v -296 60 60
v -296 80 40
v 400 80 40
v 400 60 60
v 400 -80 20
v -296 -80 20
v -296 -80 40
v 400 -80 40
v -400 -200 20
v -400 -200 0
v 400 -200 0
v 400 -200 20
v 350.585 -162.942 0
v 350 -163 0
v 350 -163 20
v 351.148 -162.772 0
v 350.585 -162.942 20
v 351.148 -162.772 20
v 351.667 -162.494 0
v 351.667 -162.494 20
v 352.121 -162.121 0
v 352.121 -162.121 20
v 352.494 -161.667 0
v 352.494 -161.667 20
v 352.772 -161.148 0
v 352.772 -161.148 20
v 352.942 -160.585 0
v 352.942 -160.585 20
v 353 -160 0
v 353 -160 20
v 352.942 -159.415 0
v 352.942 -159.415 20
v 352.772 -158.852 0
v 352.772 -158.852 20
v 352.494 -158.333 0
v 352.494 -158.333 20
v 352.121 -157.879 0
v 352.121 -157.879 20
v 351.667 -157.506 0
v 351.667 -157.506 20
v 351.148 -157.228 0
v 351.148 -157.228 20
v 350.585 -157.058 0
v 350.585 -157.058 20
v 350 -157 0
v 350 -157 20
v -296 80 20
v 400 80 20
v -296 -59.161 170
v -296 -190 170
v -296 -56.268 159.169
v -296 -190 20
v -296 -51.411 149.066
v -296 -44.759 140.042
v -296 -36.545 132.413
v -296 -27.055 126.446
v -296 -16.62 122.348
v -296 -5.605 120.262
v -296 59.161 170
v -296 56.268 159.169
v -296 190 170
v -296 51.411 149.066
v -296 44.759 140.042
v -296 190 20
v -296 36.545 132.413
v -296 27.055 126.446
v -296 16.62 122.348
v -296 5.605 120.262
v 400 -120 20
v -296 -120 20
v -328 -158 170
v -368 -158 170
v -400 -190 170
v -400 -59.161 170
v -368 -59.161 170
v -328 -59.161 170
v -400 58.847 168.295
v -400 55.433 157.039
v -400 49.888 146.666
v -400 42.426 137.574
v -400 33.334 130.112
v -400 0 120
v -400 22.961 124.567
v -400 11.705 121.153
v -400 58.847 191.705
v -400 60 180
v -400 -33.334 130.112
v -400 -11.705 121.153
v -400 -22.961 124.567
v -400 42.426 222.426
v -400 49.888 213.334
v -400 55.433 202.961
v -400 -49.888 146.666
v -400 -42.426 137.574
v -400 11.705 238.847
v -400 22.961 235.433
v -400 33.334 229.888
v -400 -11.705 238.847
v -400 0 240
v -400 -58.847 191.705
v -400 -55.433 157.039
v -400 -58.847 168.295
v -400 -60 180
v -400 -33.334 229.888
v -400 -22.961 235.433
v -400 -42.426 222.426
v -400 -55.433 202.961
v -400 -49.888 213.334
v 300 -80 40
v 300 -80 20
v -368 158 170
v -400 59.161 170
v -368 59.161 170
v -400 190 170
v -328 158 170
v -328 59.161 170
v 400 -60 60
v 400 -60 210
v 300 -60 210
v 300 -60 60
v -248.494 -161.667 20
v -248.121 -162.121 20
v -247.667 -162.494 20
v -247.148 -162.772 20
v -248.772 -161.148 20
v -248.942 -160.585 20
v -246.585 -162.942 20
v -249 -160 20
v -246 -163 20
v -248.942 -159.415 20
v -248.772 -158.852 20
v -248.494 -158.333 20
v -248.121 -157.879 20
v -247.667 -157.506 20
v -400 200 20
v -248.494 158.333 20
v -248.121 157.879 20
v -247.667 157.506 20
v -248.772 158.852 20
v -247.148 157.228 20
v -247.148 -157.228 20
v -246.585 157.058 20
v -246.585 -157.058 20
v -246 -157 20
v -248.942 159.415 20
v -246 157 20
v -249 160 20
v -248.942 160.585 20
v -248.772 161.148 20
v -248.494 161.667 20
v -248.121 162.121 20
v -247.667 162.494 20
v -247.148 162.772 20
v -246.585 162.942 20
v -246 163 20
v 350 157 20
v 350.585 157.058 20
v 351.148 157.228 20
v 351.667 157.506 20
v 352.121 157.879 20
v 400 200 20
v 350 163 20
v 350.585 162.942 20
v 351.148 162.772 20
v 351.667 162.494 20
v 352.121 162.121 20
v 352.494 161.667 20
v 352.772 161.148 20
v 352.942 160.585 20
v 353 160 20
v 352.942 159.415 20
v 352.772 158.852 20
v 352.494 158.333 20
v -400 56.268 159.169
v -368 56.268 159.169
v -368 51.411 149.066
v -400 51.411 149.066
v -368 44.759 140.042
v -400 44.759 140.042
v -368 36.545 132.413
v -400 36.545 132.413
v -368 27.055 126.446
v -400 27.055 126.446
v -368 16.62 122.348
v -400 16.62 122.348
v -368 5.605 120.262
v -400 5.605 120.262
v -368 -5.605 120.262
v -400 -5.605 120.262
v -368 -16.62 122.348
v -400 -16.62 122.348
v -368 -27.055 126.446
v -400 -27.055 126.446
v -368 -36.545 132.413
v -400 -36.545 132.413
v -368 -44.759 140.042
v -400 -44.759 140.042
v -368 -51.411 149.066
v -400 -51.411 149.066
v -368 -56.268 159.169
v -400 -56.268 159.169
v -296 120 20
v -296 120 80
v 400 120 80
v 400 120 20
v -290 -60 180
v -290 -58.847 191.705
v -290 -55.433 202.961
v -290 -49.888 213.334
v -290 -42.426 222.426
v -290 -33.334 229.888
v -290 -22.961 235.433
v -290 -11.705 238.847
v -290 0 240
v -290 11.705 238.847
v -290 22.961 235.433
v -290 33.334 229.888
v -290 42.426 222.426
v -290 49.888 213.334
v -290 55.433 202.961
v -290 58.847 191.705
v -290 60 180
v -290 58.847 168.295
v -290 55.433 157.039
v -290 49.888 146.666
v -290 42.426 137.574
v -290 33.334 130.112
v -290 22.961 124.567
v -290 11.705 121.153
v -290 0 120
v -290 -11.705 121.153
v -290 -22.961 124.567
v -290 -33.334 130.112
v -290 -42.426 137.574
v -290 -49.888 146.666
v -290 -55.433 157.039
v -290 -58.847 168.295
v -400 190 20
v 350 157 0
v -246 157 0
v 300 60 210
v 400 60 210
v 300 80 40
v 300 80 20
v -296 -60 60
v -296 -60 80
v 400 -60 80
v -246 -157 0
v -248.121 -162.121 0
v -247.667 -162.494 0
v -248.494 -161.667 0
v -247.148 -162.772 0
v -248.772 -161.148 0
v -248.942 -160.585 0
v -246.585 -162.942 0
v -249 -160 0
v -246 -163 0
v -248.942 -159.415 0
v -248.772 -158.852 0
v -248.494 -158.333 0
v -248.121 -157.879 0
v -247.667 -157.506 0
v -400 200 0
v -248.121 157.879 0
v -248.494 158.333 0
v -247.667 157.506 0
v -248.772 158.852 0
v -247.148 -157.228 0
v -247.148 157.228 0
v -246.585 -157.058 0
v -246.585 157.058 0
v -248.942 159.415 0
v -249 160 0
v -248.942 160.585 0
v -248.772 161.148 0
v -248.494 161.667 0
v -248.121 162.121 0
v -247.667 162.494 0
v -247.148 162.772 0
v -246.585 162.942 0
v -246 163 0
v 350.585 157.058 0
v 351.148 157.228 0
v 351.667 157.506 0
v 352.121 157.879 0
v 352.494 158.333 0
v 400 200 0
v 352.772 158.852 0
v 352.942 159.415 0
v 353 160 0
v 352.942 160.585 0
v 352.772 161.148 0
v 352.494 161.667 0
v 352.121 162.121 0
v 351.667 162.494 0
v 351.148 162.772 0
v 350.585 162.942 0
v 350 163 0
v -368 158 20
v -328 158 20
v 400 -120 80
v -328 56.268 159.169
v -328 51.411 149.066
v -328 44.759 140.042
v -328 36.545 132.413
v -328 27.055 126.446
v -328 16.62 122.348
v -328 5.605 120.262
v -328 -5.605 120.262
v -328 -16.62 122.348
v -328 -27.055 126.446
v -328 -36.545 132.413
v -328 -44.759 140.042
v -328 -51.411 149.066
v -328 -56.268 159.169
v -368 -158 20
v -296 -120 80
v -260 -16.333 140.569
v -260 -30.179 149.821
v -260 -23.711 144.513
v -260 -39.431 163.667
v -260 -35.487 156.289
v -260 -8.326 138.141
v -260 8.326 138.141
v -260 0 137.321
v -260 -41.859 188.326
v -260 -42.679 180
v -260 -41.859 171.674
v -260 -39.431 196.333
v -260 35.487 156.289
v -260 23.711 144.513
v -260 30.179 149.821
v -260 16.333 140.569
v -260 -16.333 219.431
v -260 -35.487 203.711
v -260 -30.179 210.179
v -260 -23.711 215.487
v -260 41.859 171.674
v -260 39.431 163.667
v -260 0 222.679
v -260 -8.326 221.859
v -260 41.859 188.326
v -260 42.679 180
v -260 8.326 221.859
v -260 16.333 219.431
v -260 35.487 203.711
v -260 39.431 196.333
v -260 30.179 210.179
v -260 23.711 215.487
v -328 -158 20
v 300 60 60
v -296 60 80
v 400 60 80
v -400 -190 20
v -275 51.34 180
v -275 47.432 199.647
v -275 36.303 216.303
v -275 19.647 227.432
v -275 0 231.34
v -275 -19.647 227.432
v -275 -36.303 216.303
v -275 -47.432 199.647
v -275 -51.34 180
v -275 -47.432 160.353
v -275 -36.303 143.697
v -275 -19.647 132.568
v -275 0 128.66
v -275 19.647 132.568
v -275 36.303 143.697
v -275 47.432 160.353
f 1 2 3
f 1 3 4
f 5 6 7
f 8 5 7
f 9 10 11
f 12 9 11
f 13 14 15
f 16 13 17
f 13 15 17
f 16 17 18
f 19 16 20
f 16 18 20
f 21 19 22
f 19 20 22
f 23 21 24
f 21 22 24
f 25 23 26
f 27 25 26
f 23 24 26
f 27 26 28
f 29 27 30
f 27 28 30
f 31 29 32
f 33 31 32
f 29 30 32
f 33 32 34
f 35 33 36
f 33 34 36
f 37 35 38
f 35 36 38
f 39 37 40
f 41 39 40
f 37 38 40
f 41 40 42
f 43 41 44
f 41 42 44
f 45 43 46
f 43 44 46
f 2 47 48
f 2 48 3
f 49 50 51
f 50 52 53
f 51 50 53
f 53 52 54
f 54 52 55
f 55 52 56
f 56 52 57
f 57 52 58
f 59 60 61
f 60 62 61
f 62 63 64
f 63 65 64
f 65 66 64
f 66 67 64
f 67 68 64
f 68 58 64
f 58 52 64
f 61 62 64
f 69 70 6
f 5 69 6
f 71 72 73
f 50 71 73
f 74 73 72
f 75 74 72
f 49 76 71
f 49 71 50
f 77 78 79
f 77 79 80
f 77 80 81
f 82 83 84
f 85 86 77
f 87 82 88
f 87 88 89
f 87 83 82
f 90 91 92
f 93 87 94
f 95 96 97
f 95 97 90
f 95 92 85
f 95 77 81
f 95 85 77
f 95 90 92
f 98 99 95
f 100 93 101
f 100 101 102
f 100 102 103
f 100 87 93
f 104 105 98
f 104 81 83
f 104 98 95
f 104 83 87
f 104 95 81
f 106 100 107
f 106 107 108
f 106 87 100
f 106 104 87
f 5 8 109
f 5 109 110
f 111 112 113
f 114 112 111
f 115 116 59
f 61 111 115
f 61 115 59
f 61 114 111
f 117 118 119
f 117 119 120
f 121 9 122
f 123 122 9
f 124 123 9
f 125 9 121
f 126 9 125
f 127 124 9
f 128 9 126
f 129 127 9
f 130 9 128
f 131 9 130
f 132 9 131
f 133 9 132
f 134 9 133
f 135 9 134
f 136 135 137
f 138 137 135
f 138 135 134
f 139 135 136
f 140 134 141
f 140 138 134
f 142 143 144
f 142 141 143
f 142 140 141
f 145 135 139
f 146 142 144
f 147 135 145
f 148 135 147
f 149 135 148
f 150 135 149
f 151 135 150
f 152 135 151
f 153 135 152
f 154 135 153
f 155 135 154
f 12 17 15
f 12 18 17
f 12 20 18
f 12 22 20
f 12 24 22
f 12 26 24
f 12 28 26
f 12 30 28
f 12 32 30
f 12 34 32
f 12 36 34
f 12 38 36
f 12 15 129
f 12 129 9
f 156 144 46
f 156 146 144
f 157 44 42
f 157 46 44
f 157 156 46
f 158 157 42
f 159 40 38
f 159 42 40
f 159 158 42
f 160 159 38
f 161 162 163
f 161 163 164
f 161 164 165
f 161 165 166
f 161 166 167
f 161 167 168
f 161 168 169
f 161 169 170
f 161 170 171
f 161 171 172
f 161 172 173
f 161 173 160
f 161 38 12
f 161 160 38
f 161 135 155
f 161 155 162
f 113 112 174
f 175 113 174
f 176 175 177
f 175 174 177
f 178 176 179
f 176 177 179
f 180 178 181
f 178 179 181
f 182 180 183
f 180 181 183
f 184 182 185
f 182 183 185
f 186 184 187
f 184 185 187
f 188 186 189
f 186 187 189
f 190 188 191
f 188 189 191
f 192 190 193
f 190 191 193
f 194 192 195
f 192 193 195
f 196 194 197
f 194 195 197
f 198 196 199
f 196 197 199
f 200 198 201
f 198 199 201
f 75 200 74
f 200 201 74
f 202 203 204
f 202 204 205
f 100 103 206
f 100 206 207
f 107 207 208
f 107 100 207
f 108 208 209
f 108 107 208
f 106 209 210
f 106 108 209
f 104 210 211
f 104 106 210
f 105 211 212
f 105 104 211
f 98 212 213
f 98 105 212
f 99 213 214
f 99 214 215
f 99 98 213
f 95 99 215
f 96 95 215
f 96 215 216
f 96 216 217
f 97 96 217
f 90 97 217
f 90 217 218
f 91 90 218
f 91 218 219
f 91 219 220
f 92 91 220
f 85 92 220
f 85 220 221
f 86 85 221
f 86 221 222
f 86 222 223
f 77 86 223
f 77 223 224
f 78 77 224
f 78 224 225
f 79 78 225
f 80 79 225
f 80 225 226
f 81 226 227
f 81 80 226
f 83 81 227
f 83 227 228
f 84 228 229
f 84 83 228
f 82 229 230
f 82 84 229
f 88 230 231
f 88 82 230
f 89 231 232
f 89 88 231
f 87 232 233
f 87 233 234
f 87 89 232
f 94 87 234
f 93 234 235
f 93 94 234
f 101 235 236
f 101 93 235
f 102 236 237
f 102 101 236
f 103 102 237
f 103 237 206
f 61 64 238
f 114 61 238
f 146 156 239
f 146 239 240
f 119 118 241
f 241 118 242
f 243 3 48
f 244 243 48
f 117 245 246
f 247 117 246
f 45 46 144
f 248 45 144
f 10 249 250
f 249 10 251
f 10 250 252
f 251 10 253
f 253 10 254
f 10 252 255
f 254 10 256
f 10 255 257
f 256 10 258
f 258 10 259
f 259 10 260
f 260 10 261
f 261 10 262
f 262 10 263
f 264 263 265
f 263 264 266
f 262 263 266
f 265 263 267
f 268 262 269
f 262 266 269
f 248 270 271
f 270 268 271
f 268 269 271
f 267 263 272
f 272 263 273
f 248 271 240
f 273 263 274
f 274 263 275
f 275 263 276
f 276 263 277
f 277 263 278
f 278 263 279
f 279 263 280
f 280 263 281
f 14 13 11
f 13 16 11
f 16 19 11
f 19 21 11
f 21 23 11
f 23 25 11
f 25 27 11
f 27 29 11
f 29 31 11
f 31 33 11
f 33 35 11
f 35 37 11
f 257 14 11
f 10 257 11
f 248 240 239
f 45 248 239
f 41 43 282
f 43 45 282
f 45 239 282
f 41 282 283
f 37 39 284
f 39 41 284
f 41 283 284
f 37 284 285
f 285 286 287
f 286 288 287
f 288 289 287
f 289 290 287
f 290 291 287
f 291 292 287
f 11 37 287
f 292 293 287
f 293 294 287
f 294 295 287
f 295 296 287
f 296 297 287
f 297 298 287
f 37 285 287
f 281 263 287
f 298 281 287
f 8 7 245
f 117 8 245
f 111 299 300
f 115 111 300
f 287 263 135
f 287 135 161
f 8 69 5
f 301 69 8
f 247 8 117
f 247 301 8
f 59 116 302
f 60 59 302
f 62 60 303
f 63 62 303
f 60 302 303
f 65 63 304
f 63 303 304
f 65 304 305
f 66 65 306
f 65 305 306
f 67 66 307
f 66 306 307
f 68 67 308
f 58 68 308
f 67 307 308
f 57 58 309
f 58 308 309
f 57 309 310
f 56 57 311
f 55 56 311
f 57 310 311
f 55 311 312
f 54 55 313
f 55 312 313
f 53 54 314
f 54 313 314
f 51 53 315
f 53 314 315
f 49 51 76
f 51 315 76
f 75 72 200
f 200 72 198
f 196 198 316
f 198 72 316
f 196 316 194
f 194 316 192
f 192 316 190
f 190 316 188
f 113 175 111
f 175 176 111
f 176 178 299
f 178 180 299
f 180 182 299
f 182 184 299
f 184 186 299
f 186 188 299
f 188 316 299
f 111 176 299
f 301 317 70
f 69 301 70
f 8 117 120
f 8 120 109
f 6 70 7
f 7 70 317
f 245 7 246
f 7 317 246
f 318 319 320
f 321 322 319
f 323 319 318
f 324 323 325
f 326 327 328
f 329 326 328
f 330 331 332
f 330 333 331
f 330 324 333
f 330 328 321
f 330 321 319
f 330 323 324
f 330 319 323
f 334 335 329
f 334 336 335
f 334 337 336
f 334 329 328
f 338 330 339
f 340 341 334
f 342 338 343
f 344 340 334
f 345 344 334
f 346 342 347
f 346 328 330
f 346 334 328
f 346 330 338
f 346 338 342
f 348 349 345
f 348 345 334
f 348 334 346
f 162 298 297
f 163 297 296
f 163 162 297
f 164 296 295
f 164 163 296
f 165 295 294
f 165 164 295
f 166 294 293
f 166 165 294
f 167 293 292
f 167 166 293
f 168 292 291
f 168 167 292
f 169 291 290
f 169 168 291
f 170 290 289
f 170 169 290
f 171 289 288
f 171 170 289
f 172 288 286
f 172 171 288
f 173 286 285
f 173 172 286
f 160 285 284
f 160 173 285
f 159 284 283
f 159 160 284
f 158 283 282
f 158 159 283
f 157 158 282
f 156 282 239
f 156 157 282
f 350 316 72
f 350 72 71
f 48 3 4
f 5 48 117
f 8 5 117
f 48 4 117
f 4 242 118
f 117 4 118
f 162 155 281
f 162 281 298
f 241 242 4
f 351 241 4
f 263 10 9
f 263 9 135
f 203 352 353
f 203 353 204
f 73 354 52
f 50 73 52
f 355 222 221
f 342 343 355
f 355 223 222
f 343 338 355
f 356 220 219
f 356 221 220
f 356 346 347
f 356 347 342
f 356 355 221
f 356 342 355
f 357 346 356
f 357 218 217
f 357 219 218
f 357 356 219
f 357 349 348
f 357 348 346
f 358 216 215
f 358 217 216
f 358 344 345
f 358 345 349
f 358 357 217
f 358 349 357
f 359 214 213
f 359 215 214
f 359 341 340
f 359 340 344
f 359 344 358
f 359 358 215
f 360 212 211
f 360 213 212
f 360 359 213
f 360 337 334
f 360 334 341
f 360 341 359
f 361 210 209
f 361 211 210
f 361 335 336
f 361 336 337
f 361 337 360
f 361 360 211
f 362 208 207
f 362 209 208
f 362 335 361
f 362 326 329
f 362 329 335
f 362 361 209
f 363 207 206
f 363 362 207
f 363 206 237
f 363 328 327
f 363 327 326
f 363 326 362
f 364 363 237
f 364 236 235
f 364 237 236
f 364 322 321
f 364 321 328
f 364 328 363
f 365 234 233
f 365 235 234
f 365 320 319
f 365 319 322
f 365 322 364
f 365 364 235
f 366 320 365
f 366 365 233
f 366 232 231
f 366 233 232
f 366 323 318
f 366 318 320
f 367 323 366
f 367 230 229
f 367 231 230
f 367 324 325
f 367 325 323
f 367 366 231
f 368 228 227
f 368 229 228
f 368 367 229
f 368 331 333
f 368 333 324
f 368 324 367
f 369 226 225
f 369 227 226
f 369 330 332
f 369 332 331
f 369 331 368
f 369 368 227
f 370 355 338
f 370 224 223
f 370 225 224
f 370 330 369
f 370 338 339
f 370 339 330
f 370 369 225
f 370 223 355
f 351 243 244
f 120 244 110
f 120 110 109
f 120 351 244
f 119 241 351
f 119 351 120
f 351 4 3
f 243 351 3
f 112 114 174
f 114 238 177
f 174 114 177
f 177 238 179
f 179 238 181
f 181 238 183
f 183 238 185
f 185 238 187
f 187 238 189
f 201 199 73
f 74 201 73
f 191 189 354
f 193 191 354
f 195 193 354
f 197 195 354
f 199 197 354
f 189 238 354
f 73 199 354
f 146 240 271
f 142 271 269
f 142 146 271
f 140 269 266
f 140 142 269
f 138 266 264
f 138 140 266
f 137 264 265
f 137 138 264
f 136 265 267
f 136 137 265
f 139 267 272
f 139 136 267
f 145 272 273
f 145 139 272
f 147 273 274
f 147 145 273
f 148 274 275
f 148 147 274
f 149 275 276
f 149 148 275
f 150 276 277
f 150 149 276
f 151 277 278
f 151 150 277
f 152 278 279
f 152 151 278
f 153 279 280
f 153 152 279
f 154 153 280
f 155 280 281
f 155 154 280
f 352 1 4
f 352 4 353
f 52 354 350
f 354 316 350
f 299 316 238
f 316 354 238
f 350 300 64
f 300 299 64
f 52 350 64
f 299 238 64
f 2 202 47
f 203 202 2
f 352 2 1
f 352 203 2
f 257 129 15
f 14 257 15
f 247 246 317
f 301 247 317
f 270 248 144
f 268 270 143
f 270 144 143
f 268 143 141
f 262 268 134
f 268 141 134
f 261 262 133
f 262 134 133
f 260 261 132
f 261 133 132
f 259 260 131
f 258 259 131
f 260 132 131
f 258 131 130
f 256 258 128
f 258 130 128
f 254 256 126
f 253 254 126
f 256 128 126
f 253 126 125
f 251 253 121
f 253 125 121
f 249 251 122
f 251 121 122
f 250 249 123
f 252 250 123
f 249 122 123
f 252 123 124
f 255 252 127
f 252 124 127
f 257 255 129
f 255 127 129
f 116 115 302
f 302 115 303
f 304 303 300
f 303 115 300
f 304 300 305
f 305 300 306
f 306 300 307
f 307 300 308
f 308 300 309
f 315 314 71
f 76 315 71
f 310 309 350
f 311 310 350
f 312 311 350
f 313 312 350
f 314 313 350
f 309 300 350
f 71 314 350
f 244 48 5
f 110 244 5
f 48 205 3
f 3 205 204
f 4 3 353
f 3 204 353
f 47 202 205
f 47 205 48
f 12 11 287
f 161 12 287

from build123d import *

# Parameters (mm, degrees)
F0_W      = 800
F0_H      = 400
F1_DEPTH  = 20
F2_W      = 40
F2_H      = 32
F3_DEPTH  = 150
F5_DEPTH  = 800.001
F6_R      = 60
F7_DEPTH  = 110
F8_R      = 60
F9_DEPTH  = 30
F9_TAPER  = 30
F11_DEPTH = 696
F14_DEPTH = 100
F17_DEPTH = 20.001


# Not quite as in the source:
# - a pattern or mirror of a feature is missing from the dataset's text; its kind, count and spacing are read off the source's solid


with BuildPart() as f1:
    # F0 (on Top) → F1 (new body)
    with BuildSketch(Plane.XY):
        Rectangle(F0_W, F0_H)
    extrude(amount=F1_DEPTH)

    # F16 (on face) → F17 (cut, through all)
    with BuildSketch(Plane.XY.offset(20)):
        with BuildLine():
            ThreePointArc((-246, -157), (-249, -160), (-246, -163))
            Line((-246, -163), (350, -163))
            ThreePointArc((350, -163), (353, -160), (350, -157))
            Line((350, -157), (-246, -157))
        make_face()
    f17 = extrude(amount=-F17_DEPTH, mode=Mode.SUBTRACT)

    # F17_copies: F17 across plane
    add(f17.mirror(Plane.ZX), mode=Mode.SUBTRACT)


with BuildPart() as f3:
    # F2 (on face) → F3 (new body)
    with BuildSketch(Plane.XY.offset(20)):
        Polygon((-400, 190), (-400, -190), (-368, -190), (-368, -158), (-368, 158), (-368, 190), align=None)
        Polygon((-328, -158), (-328, -190), (-296, -190), (-296, 190), (-328, 190), (-328, 158), align=None)
        with Locations((-348, -174)):
            Rectangle(F2_W, F2_H)
        with Locations((-348, 174)):
            Rectangle(F2_W, F2_H)
    extrude(amount=F3_DEPTH)

    # F4 (on face) → F5 (cut, through all)
    with BuildSketch(Plane(origin=(-400, 0, 0), x_dir=(0, -1, 0), z_dir=(-1, 0, 0))):
        with BuildLine():
            ThreePointArc((59.160797831, 170), (59.7898313673, 174.9824243832), (60, 180))
            ThreePointArc((60, 180), (-5.0175756168, 239.7898313673), (-59.160797831, 170))
            Line((-59.160797831, 170), (59.160797831, 170))
        make_face()
        with BuildLine():
            Line((59.160797831, 170), (-59.160797831, 170))
            ThreePointArc((-59.160797831, 170), (0, 120), (59.160797831, 170))
        make_face()
    extrude(amount=-F5_DEPTH, mode=Mode.SUBTRACT)


with BuildPart() as f7:
    # F6 (on face) → F7 (new body)
    with BuildSketch(Plane(origin=(-400, 0, 0), x_dir=(0, -1, 0), z_dir=(-1, 0, 0))):
        with Locations((0, 180)):
            Circle(F6_R)
    extrude(amount=-F7_DEPTH)

    # F8 (on face) → F9 (join)
    with BuildSketch(Plane.YZ.offset(-290)):
        with Locations((0, 180)):
            Circle(F8_R)
    extrude(amount=F9_DEPTH, taper=F9_TAPER)


with BuildPart() as f11:
    # F10 (on face) → F11 (new body, through all)
    with BuildSketch(Plane.YZ.offset(-296)):
        Polygon((-120, 20), (-80, 20), (-80, 40), (-60, 60), (-60, 80), (-120, 80), align=None)
    extrude(amount=F11_DEPTH)


with BuildPart() as f12_1:
    # F12: instance of F11
    add(f11.part.mirror(Plane.XZ))


with BuildPart() as f14:
    # F13 (on face) → F14 (new body)
    with BuildSketch(Plane.YZ.offset(400)):
        Polygon((-80, 40), (-80, 20), (0, 20), (0, 210), (-60, 210), (-60, 60), align=None)
    extrude(amount=-F14_DEPTH)

    # F15: F14 across face


with BuildPart() as f14_1:
    add(f14.part)
    add(f14.part.mirror(Plane(origin=(350, 0, 115), x_dir=(-1, 0, 0), z_dir=(0, 1, 0))))


solid = Compound([f1.part, f3.part, f7.part, f11.part, f12_1.part, f14_1.part])
